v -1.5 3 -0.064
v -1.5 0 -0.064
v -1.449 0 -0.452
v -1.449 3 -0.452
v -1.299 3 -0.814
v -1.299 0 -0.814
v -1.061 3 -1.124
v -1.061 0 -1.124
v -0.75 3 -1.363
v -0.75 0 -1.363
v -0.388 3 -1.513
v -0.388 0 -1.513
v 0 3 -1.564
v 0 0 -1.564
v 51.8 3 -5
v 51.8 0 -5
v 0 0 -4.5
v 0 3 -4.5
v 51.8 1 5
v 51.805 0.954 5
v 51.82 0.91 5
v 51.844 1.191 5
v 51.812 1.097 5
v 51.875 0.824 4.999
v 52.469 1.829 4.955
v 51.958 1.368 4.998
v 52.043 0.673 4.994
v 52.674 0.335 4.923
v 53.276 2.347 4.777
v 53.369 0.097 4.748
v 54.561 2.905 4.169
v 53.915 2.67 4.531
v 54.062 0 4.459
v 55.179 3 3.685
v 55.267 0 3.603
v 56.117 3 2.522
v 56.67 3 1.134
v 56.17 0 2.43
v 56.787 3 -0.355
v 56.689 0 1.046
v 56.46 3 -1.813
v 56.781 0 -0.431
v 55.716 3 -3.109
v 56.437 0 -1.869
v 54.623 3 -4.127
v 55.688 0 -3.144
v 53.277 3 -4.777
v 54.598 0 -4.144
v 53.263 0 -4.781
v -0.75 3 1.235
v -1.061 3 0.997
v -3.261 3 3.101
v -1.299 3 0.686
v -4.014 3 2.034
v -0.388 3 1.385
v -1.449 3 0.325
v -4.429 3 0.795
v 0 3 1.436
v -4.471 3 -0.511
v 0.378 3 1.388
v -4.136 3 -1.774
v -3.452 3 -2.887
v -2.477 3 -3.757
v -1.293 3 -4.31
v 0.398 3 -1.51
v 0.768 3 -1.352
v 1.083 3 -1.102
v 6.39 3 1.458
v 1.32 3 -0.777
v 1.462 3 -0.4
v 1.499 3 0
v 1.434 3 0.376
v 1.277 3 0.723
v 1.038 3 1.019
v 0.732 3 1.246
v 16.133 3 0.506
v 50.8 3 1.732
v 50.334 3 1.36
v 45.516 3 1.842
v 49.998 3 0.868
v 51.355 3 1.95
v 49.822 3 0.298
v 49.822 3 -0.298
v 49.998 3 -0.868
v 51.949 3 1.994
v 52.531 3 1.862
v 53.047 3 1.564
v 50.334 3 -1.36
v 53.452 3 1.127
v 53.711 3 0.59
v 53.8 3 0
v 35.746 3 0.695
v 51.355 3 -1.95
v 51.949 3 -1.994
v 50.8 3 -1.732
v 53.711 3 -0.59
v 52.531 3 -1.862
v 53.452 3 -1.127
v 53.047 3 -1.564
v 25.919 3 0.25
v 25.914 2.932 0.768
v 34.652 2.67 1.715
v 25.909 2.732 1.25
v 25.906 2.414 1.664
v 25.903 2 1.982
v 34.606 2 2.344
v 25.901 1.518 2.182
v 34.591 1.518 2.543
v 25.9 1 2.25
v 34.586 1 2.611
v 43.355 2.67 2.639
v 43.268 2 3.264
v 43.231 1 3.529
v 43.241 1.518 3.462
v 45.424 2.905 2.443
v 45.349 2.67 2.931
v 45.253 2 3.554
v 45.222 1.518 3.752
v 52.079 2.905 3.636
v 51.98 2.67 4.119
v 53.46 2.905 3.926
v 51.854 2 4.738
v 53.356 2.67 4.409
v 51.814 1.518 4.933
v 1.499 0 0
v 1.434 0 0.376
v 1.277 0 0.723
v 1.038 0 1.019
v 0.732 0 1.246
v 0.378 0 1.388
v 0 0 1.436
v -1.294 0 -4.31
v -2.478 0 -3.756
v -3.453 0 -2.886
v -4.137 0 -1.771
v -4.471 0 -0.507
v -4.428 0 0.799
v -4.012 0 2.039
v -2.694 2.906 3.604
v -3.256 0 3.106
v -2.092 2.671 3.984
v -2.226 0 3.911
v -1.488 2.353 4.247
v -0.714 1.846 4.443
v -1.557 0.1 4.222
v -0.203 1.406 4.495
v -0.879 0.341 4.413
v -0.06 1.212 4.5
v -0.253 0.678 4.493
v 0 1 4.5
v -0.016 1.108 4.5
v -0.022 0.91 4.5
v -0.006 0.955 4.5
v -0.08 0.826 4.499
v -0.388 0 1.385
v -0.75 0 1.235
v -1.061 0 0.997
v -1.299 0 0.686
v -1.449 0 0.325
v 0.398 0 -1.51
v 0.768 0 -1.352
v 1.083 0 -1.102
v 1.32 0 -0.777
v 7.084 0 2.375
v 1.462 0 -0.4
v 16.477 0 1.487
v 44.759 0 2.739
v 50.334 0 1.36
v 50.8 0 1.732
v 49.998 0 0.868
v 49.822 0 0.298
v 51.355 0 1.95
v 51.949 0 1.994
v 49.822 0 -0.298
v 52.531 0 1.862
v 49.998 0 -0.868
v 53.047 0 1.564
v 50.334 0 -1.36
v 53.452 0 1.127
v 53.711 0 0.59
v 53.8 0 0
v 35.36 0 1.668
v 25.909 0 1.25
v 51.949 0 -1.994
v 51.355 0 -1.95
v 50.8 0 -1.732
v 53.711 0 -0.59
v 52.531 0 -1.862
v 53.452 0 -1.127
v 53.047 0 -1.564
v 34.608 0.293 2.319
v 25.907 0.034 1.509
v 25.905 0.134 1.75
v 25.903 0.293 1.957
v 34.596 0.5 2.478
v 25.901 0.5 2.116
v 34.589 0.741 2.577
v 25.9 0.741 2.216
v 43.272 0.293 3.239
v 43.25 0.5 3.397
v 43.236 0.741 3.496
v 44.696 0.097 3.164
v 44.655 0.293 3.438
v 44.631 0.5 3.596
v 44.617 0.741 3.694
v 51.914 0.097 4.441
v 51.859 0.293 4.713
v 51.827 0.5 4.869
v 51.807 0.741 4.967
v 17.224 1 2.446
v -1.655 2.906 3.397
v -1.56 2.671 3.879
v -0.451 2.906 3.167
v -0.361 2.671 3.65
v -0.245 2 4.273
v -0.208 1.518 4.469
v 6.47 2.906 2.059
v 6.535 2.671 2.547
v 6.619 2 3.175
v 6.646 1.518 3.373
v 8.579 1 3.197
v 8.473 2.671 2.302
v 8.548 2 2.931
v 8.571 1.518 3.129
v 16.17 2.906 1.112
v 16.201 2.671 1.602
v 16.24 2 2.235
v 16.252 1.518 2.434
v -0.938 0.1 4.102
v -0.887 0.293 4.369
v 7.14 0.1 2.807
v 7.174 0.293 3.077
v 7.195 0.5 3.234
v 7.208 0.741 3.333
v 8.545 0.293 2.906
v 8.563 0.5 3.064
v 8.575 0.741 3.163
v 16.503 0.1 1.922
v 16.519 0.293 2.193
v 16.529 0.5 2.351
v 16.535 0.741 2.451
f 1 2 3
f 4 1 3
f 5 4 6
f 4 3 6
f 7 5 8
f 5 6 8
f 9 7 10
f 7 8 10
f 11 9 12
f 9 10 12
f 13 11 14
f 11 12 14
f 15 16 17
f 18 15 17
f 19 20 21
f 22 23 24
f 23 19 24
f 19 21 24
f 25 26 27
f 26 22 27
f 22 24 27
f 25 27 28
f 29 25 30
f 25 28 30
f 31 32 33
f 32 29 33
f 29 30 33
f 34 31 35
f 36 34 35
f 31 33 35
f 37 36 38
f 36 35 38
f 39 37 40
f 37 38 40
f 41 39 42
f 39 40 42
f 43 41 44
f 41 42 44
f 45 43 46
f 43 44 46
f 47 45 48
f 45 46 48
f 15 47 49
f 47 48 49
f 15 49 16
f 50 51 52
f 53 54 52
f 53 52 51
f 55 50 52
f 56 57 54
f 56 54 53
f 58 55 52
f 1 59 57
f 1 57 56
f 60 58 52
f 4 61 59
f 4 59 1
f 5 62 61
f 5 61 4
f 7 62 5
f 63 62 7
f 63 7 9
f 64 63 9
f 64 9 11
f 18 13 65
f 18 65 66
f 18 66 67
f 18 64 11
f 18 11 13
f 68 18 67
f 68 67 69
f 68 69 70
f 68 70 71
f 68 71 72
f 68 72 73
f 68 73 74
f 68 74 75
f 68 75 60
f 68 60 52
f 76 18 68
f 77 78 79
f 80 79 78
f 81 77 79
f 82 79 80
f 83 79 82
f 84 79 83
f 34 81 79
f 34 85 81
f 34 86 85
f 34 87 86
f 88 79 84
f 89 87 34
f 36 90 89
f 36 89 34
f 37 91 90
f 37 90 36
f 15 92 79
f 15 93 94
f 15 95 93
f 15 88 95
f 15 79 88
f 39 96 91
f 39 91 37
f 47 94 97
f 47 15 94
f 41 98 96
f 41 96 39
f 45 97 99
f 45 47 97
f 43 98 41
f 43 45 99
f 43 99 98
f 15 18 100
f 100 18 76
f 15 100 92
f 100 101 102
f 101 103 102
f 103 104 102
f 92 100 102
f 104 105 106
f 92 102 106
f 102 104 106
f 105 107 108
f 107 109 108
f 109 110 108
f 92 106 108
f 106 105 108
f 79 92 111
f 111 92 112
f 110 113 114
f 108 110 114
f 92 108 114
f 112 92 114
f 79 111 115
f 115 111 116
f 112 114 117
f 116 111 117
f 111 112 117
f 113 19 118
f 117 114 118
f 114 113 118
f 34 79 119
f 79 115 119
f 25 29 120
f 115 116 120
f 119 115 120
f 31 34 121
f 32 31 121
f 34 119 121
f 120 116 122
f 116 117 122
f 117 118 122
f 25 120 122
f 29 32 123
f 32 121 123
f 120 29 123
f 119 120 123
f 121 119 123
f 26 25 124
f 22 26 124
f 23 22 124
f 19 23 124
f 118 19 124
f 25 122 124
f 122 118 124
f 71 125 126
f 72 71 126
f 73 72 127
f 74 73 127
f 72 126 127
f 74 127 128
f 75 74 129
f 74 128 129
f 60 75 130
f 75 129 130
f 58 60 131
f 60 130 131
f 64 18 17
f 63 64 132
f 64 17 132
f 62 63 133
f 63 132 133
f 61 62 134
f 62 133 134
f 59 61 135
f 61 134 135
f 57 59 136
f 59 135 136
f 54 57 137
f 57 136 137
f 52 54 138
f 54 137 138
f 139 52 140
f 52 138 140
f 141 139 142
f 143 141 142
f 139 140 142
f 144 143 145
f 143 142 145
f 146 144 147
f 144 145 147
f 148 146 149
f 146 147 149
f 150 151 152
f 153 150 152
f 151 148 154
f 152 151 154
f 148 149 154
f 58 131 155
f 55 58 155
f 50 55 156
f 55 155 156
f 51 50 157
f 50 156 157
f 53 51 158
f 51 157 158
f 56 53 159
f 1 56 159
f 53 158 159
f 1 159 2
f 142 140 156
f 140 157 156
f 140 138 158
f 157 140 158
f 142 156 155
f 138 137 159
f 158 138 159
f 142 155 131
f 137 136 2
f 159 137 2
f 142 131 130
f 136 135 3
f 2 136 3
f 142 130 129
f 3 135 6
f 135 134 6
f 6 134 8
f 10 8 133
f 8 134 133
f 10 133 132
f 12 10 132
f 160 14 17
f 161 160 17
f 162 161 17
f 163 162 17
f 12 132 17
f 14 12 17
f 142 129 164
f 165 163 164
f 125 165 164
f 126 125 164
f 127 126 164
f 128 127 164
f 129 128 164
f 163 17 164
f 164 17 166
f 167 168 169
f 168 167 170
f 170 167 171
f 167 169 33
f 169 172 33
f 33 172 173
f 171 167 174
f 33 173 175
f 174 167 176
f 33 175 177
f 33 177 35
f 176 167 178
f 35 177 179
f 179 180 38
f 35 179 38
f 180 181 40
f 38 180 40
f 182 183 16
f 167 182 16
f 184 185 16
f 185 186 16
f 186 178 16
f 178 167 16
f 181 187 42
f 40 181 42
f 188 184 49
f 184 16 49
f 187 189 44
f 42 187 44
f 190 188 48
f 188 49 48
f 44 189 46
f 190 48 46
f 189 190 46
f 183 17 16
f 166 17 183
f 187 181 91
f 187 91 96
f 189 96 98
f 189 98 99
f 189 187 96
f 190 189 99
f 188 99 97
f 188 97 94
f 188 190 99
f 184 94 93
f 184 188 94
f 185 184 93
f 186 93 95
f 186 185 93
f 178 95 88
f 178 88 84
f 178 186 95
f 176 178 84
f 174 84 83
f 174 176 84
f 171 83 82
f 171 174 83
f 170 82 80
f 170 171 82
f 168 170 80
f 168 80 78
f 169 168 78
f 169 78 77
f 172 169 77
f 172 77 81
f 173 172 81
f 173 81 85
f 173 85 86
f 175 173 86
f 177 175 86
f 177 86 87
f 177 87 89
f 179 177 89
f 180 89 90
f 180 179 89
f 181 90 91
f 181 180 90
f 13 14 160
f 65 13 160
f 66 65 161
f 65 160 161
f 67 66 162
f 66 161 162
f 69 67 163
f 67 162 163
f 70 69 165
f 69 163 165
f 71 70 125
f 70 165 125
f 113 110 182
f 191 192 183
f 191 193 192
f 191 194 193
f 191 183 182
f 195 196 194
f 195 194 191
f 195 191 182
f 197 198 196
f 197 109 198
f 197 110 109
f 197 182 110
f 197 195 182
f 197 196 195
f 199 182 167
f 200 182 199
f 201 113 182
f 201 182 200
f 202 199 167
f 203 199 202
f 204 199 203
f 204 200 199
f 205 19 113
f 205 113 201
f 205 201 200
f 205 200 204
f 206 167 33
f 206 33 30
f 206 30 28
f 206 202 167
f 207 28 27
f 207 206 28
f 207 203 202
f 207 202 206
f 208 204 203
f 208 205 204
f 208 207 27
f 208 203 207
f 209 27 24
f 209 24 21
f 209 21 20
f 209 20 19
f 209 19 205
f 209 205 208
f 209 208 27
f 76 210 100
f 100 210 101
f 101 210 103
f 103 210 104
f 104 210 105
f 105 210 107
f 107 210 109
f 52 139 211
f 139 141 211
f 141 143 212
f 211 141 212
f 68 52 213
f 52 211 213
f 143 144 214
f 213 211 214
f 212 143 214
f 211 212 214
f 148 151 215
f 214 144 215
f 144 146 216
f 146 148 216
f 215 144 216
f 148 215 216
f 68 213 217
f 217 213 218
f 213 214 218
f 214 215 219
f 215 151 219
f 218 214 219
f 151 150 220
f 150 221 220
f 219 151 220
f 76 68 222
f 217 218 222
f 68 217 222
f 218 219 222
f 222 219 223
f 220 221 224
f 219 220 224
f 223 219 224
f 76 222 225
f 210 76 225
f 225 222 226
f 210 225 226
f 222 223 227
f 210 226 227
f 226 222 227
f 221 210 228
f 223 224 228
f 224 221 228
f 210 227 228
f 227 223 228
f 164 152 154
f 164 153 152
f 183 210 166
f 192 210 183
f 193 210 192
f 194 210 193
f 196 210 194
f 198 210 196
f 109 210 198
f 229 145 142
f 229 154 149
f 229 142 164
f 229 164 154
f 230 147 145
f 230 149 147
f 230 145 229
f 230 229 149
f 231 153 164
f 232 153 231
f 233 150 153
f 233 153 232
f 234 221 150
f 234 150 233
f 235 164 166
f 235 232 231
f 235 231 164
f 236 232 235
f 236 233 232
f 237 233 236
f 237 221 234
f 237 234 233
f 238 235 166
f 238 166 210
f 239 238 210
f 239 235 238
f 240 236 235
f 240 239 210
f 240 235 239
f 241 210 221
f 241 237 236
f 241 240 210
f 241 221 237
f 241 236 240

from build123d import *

# Parameters (mm, degrees)
BOSS_EXTRUDE1_OUTLINE_R = 2
BOSS_EXTRUDE1_DEPTH     = 3
CUT_EXTRUDE2_DEPTH      = 3
CUT_EXTRUDE3_DEPTH      = 58.098511364
FILLET1_R               = 2
FILLET2_R               = 1


# Read off the part's stored shape, not the designer's step: Boss-Extrude1
with BuildPart() as part:
    # Boss-Extrude1 outline → Boss-Extrude1 (new body)
    with BuildSketch(Plane(origin=(0, 0, 0), x_dir=(1, 0, 0), z_dir=(0, 1, 0))):
        with BuildLine():
            ThreePointArc((0, 4.5), (-4.5, 0), (0, -4.5))
            Line((0, -4.5), (51.8, -5))
            ThreePointArc((51.8, -5), (56.8, 0), (51.8, 5))
            Line((51.8, 5), (0, 4.5))
        make_face()
        with Locations((51.8, 0)):
            Circle(BOSS_EXTRUDE1_OUTLINE_R, mode=Mode.SUBTRACT)
    extrude(amount=BOSS_EXTRUDE1_DEPTH)

    # Sketch4 → Cut-Extrude2 (cut)
    with BuildSketch(Plane(origin=(0, 0, 0), x_dir=(-1, 0, 0), z_dir=(0, -1, 0))):
        with BuildLine():
            Line((0, 1.563625245), (0, 0))
            Line((0, 0), (0, -1.436374754))
            ThreePointArc((0, -1.436374754), (1.060634912, -0.997021111), (1.499960925, 0.063625245))
            ThreePointArc((1.499960925, 0.063625245), (1.060634912, 1.124271602), (0, 1.563625245))
        make_face()
        with BuildLine():
            Line((-1.498689077, 0), (0, 0))
            Line((0, 0), (0, 1.563625245))
            ThreePointArc((0, 1.563625245), (-1.082947037, 1.101560863), (-1.498689077, 0))
        make_face()
        with BuildLine():
            Line((0, -1.436374754), (0, 0))
            Line((0, 0), (-1.498689077, 0))
            ThreePointArc((-1.498689077, 0), (-1.037946482, -1.019309755), (0, -1.436374754))
        make_face()
        with BuildLine():
            Line((-1.498689077, 0), (0, 0))
            Line((0, 0), (0, 1.563625245))
            ThreePointArc((0, 1.563625245), (-1.082947037, 1.101560863), (-1.498689077, 0))
        make_face()
    extrude(amount=-CUT_EXTRUDE2_DEPTH, mode=Mode.SUBTRACT)

    # Sketch5 → Cut-Extrude3 (cut, through all)
    with BuildSketch(Plane.XZ):
        with BuildLine():
            Line((51.8, 5), (25.9, 4.75))
            Line((25.9, 4.75), (25.9, 2.25))
            ThreePointArc((25.9, 2.25), (38.916262453, 3.000928167), (51.8, 5))
        make_face()
        with BuildLine():
            Line((25.9, 2.25), (25.9, 4.75))
            Line((25.9, 4.75), (0, 4.5))
            ThreePointArc((0, 4.5), (12.89588572, 2.752084515), (25.9, 2.25))
        make_face()
        with BuildLine():
            Line((51.8, 5), (25.9, 4.75))
            Line((25.9, 4.75), (25.9, 2.25))
            ThreePointArc((25.9, 2.25), (38.916262453, 3.000928167), (51.8, 5))
        make_face()
        with BuildLine():
            Line((25.9, 2.25), (25.9, 4.75))
            Line((25.9, 4.75), (0, 4.5))
            ThreePointArc((0, 4.5), (12.89588572, 2.752084515), (25.9, 2.25))
        make_face()
    extrude(amount=-CUT_EXTRUDE3_DEPTH, mode=Mode.SUBTRACT)

    # Fillet1
    fillet1_edges = [part.edges().sort_by_distance(p)[0] for p in [
        (25.924129047, 3, 2.250230756),
    ]]
    fillet(fillet1_edges, radius=FILLET1_R)

    # Fillet2
    fillet2_edges = [part.edges().sort_by_distance(p)[0] for p in [
        (25.924129047, 0, 2.250230756),
    ]]
    fillet(fillet2_edges, radius=FILLET2_R - 0.0001)  # a hair under: the kernel refuses the full size


solid = part.part
